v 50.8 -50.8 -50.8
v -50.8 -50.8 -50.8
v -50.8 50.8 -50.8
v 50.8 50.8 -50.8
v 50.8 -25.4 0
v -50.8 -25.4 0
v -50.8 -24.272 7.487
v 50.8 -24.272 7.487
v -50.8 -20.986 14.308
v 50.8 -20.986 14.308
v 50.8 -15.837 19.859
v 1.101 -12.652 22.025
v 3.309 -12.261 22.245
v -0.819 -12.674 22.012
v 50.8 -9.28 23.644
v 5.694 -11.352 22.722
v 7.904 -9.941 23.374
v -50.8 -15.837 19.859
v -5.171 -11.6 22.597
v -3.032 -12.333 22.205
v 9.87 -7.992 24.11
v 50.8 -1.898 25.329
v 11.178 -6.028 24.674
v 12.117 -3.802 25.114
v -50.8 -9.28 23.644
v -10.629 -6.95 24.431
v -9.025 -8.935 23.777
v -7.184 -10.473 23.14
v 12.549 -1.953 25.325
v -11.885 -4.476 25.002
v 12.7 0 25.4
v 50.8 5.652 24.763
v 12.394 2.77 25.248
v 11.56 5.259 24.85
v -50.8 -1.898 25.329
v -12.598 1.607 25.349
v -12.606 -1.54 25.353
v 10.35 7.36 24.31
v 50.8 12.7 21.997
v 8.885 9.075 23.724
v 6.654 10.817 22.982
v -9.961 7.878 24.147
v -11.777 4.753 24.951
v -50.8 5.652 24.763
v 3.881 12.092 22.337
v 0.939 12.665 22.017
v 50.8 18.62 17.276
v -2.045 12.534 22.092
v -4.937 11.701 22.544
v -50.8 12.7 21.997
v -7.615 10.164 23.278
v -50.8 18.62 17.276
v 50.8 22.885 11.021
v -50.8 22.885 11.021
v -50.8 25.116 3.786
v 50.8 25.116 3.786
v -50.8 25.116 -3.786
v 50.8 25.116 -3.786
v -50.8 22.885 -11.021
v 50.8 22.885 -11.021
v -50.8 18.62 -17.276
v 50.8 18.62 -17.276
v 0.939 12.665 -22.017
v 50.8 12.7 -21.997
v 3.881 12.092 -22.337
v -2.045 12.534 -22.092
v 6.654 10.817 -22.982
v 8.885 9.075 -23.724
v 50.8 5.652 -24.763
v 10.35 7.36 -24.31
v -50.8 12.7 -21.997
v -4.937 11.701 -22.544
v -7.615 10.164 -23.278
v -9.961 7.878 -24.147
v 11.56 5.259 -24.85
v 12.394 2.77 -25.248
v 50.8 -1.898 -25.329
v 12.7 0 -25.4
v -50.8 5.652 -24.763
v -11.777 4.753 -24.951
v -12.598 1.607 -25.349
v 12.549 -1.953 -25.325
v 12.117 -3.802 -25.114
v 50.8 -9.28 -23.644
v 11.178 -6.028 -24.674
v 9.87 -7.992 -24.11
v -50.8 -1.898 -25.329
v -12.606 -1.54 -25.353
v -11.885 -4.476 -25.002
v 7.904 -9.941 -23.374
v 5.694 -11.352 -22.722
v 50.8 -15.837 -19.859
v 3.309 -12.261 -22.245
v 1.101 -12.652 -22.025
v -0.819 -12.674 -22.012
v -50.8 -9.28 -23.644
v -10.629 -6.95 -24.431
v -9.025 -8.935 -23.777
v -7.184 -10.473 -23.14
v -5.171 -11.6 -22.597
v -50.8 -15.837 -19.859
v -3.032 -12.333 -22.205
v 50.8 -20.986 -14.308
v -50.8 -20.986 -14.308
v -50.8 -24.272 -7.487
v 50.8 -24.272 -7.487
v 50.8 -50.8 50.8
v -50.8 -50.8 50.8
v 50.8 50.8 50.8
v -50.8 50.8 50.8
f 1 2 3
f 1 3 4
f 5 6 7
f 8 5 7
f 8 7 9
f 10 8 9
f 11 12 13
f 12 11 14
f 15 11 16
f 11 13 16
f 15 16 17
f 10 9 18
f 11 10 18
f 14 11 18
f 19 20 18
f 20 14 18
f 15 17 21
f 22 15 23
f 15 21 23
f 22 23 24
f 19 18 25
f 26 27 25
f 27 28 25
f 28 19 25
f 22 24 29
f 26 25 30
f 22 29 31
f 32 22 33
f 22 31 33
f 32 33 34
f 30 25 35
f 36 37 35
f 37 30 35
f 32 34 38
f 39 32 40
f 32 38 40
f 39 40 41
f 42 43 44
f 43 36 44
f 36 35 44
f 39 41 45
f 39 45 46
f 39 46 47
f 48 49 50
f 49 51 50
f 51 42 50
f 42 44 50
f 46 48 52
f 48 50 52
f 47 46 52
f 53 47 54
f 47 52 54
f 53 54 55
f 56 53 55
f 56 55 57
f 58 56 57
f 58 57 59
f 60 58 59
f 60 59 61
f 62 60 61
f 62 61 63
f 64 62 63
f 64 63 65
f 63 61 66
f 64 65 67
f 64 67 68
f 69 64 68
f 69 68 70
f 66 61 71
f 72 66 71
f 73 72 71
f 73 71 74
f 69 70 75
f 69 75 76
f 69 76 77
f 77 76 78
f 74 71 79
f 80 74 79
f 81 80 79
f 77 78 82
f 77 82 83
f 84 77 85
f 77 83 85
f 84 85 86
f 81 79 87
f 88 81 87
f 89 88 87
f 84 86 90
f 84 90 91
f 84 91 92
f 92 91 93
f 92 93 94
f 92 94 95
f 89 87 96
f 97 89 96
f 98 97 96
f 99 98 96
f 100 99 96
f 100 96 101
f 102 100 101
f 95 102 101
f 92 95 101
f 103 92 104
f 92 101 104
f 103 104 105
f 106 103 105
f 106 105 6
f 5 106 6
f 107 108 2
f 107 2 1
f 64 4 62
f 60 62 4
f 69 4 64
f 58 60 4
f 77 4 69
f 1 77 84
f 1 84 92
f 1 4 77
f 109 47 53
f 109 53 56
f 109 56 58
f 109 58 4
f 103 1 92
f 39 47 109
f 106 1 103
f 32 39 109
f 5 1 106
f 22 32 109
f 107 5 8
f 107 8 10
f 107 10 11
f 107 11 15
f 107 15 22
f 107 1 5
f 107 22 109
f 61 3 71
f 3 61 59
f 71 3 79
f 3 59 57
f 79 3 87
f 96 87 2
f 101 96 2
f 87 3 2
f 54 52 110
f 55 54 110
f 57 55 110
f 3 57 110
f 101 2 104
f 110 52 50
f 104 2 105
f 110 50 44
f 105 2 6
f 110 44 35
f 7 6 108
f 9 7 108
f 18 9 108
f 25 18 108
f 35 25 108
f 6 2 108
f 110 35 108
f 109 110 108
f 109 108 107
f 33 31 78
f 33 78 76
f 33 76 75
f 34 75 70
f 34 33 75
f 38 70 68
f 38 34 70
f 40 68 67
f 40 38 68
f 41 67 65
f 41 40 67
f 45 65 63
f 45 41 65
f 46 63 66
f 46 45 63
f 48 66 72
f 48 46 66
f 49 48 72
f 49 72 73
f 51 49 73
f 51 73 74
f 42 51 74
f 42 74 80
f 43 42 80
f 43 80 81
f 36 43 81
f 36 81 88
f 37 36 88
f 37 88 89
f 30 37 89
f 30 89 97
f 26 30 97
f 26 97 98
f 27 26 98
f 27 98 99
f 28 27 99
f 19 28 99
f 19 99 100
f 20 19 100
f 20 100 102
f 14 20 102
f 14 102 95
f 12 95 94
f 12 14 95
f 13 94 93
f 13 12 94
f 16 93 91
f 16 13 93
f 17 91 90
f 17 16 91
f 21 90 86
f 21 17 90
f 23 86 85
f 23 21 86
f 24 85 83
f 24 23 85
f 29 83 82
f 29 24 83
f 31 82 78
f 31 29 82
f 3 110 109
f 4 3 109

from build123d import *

# Parameters (mm, degrees)
F3_W     = 101.6
F3_H     = 101.6
F4_DEPTH = 50.8
F0_R     = 25.4
F5_DEPTH = 101.601
F1_R     = 12.7
F2_DEPTH = 101.6


with BuildPart() as f4:
    # F3 (on Front) → F4 (new body, symmetric)
    with BuildSketch(Plane.XZ):
        Rectangle(F3_W, F3_H)
    extrude(amount=F4_DEPTH, both=True)

    # F0 (on face) → F5 (cut, through all)
    with BuildSketch(Plane(origin=(-50.8, 0, 0), x_dir=(0, -1, 0), z_dir=(-1, 0, 0))):
        Circle(F0_R)
    extrude(amount=-F5_DEPTH, mode=Mode.SUBTRACT)

    # F1 (on face) → F2 (join)
    with BuildSketch(Plane.XY.offset(50.8)):
        Circle(F1_R)
    extrude(amount=-F2_DEPTH)


solid = f4.part
